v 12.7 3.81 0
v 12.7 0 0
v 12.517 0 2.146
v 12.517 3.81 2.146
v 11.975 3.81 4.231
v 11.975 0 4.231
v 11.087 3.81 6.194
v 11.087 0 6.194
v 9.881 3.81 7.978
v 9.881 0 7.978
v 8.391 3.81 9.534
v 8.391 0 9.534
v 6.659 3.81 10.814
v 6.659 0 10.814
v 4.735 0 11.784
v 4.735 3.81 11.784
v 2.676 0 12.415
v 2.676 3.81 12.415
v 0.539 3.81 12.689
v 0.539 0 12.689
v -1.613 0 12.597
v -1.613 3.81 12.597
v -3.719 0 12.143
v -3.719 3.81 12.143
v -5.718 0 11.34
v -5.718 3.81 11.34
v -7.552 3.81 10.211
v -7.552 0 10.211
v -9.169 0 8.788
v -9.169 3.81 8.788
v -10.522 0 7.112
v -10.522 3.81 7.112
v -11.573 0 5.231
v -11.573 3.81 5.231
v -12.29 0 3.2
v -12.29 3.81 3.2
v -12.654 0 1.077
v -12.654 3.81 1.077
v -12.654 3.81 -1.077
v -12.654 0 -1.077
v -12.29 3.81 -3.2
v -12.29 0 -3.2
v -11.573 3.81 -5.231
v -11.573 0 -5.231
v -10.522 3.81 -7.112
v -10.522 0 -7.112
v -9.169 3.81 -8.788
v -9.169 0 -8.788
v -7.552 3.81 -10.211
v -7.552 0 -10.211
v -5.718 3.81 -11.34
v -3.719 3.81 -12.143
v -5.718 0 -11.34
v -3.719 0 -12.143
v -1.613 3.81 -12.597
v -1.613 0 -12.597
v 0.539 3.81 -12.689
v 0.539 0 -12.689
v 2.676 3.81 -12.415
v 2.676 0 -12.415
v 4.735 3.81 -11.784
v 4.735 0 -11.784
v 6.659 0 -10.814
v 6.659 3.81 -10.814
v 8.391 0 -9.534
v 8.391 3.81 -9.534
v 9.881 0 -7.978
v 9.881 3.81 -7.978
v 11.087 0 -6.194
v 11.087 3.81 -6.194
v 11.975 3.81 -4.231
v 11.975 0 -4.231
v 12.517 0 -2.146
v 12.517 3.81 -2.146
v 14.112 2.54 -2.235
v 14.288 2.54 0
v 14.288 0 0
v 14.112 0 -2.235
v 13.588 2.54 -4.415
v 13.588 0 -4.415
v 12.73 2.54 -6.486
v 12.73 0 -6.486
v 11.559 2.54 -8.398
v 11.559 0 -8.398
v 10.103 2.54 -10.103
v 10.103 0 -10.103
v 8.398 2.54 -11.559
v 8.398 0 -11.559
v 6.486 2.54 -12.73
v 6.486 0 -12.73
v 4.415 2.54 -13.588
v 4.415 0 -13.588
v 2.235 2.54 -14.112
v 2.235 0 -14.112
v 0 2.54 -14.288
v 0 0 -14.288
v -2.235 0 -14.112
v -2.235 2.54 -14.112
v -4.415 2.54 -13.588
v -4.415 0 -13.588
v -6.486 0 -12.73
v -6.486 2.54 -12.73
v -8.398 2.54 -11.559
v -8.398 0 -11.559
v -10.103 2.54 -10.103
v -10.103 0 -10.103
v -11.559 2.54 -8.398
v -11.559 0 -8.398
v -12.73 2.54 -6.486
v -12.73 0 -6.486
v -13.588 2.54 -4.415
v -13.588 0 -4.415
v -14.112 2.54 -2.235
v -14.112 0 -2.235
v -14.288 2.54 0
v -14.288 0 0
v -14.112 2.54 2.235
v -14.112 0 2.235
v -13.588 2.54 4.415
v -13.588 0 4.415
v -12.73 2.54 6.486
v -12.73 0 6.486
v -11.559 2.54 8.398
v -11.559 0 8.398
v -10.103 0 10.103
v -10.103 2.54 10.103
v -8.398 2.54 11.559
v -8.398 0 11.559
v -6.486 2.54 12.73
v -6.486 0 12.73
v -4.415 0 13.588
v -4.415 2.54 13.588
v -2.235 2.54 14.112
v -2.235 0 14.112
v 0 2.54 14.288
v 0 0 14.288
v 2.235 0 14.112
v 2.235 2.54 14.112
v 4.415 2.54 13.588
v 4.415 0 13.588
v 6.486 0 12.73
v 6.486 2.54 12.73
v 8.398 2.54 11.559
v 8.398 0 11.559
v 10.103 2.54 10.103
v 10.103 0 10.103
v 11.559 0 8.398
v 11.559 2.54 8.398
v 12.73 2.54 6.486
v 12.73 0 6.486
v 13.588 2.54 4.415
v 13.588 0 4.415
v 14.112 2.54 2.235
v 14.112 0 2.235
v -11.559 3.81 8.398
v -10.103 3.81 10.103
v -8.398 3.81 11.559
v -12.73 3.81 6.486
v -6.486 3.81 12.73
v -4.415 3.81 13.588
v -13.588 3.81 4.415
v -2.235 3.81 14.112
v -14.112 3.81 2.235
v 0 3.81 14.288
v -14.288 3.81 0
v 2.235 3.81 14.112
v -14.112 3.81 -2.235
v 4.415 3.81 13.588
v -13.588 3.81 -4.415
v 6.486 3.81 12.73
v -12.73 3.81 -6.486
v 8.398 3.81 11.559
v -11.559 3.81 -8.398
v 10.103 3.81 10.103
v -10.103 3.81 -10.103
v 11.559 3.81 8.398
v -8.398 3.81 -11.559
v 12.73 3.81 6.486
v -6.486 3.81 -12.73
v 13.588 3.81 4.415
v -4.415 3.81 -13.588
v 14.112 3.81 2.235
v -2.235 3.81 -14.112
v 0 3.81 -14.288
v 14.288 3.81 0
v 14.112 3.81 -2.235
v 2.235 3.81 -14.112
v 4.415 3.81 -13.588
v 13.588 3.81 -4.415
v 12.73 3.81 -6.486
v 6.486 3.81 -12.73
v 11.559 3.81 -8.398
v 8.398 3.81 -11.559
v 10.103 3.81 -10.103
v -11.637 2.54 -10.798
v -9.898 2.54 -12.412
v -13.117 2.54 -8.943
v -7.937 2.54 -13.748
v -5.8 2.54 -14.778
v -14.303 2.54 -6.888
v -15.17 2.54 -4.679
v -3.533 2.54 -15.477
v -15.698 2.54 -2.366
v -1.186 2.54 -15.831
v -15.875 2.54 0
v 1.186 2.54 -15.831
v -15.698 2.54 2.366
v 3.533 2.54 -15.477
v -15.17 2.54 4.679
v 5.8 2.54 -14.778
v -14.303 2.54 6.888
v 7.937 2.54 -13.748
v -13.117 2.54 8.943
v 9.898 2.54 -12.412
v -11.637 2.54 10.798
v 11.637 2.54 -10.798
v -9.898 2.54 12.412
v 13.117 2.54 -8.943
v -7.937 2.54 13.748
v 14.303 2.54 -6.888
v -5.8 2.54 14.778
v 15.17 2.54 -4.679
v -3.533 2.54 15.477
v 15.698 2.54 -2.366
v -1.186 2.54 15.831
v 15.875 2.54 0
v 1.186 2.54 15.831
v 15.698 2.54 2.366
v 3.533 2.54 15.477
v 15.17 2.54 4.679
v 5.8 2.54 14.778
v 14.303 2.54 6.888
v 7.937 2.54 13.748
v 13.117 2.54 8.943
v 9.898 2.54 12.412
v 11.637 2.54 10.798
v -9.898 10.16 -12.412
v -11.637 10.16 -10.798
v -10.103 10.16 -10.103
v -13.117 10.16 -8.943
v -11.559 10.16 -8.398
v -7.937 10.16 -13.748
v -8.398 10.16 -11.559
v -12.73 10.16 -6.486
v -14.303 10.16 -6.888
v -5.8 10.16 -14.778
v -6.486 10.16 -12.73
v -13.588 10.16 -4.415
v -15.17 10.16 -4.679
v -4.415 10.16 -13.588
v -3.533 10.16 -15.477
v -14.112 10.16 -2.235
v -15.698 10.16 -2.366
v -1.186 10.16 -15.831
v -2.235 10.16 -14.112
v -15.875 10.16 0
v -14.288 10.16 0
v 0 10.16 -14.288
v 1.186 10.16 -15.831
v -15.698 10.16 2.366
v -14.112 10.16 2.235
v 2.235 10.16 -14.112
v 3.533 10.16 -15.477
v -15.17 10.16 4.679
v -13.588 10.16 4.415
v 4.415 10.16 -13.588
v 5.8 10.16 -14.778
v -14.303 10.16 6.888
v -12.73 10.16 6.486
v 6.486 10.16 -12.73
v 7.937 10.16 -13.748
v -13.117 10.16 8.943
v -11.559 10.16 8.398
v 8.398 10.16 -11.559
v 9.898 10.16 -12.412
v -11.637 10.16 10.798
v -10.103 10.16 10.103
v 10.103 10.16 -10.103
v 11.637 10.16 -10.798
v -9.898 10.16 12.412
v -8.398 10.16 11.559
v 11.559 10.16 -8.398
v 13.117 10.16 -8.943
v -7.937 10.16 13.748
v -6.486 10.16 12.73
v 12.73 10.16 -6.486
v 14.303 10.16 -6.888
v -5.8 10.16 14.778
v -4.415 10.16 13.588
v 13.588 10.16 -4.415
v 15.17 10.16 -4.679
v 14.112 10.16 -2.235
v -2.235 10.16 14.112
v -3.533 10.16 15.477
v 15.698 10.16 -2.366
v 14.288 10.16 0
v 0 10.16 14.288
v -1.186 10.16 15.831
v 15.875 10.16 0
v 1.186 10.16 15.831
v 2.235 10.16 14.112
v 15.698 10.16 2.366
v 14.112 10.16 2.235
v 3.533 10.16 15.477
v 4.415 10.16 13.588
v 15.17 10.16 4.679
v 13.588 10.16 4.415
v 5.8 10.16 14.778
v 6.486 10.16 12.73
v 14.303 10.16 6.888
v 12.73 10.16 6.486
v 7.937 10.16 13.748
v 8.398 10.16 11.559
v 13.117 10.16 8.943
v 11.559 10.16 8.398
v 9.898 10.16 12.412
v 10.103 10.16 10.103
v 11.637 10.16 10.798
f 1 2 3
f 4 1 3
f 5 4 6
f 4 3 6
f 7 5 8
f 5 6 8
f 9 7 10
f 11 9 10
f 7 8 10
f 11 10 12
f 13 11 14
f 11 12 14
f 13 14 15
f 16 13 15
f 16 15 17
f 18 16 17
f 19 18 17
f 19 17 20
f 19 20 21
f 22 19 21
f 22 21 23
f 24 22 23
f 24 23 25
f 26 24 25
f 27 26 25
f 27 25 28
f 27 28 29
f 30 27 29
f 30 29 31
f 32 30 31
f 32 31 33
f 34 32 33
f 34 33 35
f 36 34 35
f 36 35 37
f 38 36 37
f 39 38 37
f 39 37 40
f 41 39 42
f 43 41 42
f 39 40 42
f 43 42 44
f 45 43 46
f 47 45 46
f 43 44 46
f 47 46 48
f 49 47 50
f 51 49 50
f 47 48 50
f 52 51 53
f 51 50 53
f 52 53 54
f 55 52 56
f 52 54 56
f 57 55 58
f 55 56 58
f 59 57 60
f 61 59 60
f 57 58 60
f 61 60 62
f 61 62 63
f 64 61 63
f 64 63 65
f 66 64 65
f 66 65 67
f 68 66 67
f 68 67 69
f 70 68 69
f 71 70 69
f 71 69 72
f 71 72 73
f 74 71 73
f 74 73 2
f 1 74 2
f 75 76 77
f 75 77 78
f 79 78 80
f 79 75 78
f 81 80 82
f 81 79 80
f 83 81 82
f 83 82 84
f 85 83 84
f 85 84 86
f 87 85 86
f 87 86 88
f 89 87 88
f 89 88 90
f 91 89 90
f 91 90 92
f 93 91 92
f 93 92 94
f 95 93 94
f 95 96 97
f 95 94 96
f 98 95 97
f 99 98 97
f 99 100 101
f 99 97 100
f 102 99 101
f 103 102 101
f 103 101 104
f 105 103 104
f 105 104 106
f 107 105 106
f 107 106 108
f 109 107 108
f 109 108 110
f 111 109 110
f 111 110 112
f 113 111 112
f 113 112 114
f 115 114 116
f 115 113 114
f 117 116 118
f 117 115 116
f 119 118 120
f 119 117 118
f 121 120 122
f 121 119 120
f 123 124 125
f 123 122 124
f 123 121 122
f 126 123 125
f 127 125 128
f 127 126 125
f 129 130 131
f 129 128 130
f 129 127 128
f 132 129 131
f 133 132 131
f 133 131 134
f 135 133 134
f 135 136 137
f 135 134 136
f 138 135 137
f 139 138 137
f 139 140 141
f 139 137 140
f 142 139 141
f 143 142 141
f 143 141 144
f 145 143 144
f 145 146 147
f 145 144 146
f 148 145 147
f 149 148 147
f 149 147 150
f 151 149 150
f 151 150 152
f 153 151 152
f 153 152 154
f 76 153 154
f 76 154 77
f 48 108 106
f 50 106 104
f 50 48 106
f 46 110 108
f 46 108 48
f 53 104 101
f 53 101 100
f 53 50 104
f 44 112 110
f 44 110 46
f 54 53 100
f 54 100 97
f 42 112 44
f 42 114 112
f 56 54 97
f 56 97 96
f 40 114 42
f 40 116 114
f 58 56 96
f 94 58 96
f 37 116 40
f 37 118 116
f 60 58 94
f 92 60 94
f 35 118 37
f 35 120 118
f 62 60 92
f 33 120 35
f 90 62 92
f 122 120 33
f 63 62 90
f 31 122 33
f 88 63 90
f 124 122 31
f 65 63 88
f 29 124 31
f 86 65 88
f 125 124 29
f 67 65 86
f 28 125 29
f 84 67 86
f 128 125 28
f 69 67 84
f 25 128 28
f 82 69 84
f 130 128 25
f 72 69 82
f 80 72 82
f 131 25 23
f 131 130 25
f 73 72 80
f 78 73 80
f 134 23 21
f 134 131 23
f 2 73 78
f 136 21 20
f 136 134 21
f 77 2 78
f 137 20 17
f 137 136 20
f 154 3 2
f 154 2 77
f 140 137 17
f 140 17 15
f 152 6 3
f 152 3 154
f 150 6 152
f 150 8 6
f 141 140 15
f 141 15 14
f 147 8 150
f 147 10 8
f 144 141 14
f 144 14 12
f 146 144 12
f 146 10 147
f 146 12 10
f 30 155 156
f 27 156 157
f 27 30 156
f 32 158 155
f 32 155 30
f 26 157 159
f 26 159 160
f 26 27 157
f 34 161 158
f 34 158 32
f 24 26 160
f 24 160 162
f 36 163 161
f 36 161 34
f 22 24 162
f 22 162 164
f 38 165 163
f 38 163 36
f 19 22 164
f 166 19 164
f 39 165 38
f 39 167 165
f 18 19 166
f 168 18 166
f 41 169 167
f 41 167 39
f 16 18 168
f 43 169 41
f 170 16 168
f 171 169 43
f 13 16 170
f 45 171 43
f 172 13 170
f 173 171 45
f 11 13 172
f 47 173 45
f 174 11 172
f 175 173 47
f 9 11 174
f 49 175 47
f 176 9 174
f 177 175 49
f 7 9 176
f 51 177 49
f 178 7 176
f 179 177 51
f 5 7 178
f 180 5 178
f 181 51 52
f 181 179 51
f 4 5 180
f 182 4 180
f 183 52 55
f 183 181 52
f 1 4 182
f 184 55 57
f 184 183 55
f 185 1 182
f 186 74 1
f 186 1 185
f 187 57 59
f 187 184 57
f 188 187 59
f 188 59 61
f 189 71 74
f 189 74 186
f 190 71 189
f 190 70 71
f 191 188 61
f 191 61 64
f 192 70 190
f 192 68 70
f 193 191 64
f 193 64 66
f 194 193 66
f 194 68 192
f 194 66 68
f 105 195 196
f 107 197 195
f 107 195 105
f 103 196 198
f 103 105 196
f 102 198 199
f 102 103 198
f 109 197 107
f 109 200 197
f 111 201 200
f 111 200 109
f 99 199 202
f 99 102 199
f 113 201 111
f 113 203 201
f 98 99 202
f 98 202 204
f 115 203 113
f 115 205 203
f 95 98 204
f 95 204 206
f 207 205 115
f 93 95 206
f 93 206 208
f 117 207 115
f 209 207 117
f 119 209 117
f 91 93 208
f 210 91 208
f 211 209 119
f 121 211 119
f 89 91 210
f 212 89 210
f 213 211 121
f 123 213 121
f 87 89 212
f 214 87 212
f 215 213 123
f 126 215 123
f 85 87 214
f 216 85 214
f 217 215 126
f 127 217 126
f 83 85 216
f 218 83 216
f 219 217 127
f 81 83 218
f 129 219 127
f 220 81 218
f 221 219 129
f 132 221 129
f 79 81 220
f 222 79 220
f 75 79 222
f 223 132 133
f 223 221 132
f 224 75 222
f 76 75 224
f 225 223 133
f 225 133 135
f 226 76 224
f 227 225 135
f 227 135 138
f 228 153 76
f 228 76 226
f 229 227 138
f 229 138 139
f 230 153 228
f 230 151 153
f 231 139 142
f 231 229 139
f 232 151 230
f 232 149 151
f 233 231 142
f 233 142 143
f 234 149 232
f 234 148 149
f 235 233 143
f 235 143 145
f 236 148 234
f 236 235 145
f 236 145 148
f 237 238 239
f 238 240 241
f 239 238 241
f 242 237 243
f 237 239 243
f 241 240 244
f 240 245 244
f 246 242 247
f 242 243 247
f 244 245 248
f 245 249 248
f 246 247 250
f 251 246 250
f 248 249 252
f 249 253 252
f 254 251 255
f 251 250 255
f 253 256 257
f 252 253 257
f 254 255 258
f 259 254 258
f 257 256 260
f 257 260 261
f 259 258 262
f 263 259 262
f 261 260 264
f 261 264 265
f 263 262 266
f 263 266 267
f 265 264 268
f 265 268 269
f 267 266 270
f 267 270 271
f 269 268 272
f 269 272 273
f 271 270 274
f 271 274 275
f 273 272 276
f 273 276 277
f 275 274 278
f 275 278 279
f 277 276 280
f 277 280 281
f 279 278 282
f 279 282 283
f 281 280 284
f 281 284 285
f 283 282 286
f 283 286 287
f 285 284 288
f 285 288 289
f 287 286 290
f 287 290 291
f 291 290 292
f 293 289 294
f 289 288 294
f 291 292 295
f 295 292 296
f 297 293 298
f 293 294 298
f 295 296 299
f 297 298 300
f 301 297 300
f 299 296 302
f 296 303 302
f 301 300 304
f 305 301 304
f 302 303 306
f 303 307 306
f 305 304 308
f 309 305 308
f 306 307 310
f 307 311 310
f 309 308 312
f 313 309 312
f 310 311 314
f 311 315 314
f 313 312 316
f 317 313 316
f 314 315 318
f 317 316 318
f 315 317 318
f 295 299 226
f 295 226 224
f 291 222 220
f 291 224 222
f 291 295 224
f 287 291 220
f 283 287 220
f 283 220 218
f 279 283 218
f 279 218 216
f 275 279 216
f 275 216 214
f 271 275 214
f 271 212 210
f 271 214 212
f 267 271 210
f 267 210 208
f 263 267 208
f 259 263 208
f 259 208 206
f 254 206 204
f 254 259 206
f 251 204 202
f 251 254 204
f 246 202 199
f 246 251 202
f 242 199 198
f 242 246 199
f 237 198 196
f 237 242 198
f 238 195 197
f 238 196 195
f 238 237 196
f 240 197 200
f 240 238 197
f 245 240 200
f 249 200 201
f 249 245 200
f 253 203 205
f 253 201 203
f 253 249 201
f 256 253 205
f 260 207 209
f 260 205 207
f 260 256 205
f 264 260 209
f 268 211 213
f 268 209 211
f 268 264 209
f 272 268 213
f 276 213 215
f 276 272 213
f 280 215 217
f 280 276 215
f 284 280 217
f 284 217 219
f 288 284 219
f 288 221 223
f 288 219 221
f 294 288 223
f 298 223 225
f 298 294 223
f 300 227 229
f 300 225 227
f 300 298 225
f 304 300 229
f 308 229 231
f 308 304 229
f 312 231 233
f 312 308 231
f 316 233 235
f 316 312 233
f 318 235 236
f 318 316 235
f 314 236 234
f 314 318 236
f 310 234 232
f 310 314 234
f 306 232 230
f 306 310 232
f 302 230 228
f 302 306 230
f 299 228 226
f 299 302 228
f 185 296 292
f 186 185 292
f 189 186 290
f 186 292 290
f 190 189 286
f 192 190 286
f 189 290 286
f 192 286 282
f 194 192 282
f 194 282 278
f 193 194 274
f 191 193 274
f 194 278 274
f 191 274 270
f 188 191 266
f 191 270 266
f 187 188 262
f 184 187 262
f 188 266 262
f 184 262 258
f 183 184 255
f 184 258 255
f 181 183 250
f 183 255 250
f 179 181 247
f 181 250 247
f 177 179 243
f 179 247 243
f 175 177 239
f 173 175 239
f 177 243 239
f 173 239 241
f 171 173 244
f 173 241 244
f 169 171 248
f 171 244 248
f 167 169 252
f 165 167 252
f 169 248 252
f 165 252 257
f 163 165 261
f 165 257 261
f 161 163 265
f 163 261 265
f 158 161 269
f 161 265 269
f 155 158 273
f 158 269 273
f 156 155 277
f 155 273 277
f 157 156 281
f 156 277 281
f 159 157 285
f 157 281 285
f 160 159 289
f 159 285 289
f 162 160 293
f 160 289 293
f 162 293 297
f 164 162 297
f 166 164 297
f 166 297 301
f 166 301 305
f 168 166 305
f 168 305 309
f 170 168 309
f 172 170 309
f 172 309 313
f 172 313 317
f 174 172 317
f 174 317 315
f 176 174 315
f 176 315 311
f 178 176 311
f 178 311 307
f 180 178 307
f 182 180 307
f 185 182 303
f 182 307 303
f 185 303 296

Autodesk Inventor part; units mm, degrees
ref_plane "YZ Plane" through (0, 0, 0) normal (1, 0, 0) x (0, 1, 0)
ref_plane "XZ Plane" through (0, 0, 0) normal (0, 1, 0) x (-1, 0, 0)
ref_plane "XY Plane" through (0, 0, 0) normal (0, 0, 1) x (1, 0, 0)
sketch "Sketch1" plane through (0, 0, 0) normal (0, 0, 1) x (1, 0, 0)
  line L0 (14.2875, 0) -> (14.2875, 2.54)
  line L1 (14.2875, 2.54) -> (15.875, 2.54)
  line L2 (15.875, 2.54) -> (15.875, 10.16)
  line L3 (15.875, 10.16) -> (0, 10.16)
  line L4 (14.2875, 0) -> (0, 0)
  line L5 (0, 10.16) -> (0, 0)
  dimension "d0" = 14.2875
  dimension "d1" = 15.875
  dimension "d2" = 2.54
  dimension "d3" = 7.62
revolve "Revolution1" add sketch "Sketch1" angle 360 about axis through (0, 10.16, 0) along (0, -1, 0)
thread "Thread1" size "1 1/8-28 UN" class "3A" standard "ANSI Unified Screw Threads" full length
sketch "Sketch3" plane through (0, 10.16, 0) normal (0, 1, 0) x (1, 0, 0)
  circle A0 centre (0, 0) radius 14.2875
  dimension "d7" = 28.575
extrude "Extrusion1" cut sketch "Sketch3" against normal blind 6.35
sketch "Sketch4" plane through (0, 0, 0) normal (0, -1, 0) x (1, 0, 0)
  circle A0 centre (0, 0) radius 12.7
  dimension "d10" = 25.4
extrude "Extrusion2" cut sketch "Sketch4" against normal up to next
thread "Thread2" size "1 1/8-28 UN" class "2B" standard "ANSI Unified Screw Threads" full length
properties part number "simulatedFilter" material "PET Plastic"
